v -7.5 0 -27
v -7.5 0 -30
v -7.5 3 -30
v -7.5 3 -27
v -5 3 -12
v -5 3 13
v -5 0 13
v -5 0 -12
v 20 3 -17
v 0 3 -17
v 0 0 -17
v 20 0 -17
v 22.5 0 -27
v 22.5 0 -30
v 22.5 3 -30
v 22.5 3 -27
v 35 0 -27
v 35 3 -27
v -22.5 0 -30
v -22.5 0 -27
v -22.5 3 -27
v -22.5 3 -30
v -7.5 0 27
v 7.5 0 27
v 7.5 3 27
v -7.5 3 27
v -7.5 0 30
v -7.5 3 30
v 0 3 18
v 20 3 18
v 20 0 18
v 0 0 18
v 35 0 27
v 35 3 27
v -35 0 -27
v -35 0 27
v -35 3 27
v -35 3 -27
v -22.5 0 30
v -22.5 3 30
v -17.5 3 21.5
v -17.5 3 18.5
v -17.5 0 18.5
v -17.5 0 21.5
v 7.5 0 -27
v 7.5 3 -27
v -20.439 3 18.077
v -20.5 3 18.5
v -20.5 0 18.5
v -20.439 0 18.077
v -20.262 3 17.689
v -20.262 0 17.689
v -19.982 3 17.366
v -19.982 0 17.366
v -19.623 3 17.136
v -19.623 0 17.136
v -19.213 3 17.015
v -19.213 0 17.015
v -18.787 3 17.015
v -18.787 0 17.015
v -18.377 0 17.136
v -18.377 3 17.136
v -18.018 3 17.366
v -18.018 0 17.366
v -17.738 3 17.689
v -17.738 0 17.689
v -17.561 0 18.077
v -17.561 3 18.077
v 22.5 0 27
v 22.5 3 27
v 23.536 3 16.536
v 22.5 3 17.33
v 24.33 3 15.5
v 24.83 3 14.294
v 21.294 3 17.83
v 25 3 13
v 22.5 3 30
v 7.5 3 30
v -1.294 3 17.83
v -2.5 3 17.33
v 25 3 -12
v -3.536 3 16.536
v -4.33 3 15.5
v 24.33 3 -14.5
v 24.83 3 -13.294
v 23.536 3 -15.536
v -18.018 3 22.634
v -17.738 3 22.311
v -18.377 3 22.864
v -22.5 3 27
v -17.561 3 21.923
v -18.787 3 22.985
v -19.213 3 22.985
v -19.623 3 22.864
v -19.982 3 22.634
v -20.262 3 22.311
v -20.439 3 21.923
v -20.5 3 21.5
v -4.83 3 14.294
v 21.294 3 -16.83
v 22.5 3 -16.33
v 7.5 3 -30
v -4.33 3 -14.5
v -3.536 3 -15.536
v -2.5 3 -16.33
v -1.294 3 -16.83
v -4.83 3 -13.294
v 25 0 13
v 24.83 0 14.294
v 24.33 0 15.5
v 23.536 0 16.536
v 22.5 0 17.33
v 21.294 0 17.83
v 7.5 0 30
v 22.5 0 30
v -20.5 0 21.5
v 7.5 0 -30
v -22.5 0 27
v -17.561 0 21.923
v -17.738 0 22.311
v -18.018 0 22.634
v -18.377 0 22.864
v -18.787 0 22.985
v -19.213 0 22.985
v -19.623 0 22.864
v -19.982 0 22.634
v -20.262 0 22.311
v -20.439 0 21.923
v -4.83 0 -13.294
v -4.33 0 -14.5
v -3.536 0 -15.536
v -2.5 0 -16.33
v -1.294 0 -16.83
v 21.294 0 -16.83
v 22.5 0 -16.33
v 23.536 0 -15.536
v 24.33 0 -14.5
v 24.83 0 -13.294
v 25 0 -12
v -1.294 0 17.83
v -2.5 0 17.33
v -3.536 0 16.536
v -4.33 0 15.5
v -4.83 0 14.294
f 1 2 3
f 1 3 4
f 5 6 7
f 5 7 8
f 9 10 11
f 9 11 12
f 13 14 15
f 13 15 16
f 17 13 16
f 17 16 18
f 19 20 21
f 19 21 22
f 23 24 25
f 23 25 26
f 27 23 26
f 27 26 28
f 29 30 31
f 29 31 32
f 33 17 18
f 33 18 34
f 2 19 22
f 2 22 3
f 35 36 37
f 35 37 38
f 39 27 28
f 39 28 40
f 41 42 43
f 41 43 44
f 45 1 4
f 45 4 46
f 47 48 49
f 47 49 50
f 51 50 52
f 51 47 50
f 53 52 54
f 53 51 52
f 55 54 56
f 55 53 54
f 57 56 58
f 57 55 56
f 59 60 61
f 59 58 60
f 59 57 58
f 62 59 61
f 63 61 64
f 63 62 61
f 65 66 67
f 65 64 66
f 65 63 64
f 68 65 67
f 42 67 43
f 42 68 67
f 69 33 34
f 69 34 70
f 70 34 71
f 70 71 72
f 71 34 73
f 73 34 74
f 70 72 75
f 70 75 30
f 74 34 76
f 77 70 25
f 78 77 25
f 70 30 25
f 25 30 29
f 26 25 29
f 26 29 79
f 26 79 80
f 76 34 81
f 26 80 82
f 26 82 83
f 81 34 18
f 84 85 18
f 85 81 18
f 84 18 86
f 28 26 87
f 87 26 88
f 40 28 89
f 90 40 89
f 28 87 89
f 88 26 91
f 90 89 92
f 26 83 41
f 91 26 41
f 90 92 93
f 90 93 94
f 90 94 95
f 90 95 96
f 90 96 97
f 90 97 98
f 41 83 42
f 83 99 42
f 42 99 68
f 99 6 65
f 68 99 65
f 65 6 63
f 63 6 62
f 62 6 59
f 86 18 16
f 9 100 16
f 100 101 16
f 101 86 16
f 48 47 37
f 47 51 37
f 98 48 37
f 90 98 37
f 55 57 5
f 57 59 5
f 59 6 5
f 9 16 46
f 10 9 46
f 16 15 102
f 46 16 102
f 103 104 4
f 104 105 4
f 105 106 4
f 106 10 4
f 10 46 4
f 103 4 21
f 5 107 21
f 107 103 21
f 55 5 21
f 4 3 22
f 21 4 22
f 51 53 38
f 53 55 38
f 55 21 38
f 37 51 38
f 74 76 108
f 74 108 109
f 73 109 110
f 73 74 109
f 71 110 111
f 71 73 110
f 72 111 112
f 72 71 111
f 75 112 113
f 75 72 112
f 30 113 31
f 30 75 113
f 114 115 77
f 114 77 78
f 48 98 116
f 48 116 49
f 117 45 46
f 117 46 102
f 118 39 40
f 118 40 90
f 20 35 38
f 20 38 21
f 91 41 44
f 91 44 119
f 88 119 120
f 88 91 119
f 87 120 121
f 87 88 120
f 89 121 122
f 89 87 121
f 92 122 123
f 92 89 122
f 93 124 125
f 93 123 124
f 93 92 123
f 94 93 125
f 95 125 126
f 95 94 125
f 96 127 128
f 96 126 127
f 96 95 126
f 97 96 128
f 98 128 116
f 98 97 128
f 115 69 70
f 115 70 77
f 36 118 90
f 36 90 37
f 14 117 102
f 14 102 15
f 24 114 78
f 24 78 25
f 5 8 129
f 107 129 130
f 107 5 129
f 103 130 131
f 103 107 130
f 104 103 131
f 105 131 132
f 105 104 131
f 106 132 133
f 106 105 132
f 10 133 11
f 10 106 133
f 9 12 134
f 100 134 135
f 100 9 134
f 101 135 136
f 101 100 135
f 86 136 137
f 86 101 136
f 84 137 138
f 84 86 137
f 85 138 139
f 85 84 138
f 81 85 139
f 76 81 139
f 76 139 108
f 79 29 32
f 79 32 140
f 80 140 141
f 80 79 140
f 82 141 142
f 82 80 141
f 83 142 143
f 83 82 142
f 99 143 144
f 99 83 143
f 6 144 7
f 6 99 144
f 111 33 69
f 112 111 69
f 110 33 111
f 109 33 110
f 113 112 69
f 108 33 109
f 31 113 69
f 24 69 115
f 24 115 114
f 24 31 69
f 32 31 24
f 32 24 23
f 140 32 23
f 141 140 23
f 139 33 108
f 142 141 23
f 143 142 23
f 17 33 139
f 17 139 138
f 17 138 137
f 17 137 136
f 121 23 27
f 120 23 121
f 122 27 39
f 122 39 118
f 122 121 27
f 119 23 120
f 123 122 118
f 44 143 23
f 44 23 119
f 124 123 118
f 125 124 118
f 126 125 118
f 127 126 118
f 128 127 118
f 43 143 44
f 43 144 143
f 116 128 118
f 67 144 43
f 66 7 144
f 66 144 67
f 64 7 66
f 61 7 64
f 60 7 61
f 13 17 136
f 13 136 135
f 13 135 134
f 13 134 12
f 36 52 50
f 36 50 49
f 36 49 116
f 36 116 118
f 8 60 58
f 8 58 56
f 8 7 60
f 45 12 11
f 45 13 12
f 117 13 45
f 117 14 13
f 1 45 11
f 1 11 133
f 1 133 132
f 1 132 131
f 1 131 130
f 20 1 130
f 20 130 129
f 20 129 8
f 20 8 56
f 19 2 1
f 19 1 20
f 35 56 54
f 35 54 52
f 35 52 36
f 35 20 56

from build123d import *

# Parameters (mm, degrees)
BOSS_EXTRUDE1_DEPTH = 3
CUT_EXTRUDE1_DEPTH  = 47.19523785
CUT_EXTRUDE3_DEPTH  = 47.19523785


with BuildPart() as part:
    # Sketch1 → Boss-Extrude1 (new body)
    with BuildSketch(Plane(origin=(0, 0, 0), x_dir=(1, 0, 0), z_dir=(0, 1, 0))):
        Polygon((-35, 27), (-22.5, 27), (-22.5, 30), (-7.5, 30), (-7.5, 27), (7.5, 27), (7.5, 30), (22.5, 30), (22.5, 27), (35, 27), (35, -27), (22.5, -27), (22.5, -30), (7.5, -30), (7.5, -27), (-7.5, -27), (-7.5, -30), (-22.5, -30), (-22.5, -27), (-35, -27), align=None)
    extrude(amount=BOSS_EXTRUDE1_DEPTH)

    # Sketch2 → Cut-Extrude1 (cut, through all)
    with BuildSketch(Plane(origin=(0, 3, 0), x_dir=(1, 0, 0), z_dir=(0, 1, 0))):
        with BuildLine():
            Line((0, 17), (20, 17))
            ThreePointArc((20, 17), (23.535533906, 15.535533906), (25, 12))
            Line((25, 12), (25, -13))
            ThreePointArc((25, -13), (23.535533906, -16.535533906), (20, -18))
            Line((20, -18), (0, -18))
            ThreePointArc((0, -18), (-3.535533906, -16.535533906), (-5, -13))
            Line((-5, -13), (-5, 12))
            ThreePointArc((-5, 12), (-3.535533906, 15.535533906), (0, 17))
        make_face()
    extrude(amount=-CUT_EXTRUDE1_DEPTH, mode=Mode.SUBTRACT)

    # Sketch4 → Cut-Extrude3 (cut, through all)
    with BuildSketch(Plane(origin=(0, 3, 0), x_dir=(1, 0, 0), z_dir=(0, 1, 0))):
        with BuildLine():
            Line((-17.5, -18.5), (-17.5, -21.5))
            ThreePointArc((-17.5, -21.5), (-19, -23), (-20.5, -21.5))
            Line((-20.5, -21.5), (-20.5, -18.5))
            ThreePointArc((-20.5, -18.5), (-19, -17), (-17.5, -18.5))
        make_face()
    extrude(amount=-CUT_EXTRUDE3_DEPTH, mode=Mode.SUBTRACT)


solid = part.part
